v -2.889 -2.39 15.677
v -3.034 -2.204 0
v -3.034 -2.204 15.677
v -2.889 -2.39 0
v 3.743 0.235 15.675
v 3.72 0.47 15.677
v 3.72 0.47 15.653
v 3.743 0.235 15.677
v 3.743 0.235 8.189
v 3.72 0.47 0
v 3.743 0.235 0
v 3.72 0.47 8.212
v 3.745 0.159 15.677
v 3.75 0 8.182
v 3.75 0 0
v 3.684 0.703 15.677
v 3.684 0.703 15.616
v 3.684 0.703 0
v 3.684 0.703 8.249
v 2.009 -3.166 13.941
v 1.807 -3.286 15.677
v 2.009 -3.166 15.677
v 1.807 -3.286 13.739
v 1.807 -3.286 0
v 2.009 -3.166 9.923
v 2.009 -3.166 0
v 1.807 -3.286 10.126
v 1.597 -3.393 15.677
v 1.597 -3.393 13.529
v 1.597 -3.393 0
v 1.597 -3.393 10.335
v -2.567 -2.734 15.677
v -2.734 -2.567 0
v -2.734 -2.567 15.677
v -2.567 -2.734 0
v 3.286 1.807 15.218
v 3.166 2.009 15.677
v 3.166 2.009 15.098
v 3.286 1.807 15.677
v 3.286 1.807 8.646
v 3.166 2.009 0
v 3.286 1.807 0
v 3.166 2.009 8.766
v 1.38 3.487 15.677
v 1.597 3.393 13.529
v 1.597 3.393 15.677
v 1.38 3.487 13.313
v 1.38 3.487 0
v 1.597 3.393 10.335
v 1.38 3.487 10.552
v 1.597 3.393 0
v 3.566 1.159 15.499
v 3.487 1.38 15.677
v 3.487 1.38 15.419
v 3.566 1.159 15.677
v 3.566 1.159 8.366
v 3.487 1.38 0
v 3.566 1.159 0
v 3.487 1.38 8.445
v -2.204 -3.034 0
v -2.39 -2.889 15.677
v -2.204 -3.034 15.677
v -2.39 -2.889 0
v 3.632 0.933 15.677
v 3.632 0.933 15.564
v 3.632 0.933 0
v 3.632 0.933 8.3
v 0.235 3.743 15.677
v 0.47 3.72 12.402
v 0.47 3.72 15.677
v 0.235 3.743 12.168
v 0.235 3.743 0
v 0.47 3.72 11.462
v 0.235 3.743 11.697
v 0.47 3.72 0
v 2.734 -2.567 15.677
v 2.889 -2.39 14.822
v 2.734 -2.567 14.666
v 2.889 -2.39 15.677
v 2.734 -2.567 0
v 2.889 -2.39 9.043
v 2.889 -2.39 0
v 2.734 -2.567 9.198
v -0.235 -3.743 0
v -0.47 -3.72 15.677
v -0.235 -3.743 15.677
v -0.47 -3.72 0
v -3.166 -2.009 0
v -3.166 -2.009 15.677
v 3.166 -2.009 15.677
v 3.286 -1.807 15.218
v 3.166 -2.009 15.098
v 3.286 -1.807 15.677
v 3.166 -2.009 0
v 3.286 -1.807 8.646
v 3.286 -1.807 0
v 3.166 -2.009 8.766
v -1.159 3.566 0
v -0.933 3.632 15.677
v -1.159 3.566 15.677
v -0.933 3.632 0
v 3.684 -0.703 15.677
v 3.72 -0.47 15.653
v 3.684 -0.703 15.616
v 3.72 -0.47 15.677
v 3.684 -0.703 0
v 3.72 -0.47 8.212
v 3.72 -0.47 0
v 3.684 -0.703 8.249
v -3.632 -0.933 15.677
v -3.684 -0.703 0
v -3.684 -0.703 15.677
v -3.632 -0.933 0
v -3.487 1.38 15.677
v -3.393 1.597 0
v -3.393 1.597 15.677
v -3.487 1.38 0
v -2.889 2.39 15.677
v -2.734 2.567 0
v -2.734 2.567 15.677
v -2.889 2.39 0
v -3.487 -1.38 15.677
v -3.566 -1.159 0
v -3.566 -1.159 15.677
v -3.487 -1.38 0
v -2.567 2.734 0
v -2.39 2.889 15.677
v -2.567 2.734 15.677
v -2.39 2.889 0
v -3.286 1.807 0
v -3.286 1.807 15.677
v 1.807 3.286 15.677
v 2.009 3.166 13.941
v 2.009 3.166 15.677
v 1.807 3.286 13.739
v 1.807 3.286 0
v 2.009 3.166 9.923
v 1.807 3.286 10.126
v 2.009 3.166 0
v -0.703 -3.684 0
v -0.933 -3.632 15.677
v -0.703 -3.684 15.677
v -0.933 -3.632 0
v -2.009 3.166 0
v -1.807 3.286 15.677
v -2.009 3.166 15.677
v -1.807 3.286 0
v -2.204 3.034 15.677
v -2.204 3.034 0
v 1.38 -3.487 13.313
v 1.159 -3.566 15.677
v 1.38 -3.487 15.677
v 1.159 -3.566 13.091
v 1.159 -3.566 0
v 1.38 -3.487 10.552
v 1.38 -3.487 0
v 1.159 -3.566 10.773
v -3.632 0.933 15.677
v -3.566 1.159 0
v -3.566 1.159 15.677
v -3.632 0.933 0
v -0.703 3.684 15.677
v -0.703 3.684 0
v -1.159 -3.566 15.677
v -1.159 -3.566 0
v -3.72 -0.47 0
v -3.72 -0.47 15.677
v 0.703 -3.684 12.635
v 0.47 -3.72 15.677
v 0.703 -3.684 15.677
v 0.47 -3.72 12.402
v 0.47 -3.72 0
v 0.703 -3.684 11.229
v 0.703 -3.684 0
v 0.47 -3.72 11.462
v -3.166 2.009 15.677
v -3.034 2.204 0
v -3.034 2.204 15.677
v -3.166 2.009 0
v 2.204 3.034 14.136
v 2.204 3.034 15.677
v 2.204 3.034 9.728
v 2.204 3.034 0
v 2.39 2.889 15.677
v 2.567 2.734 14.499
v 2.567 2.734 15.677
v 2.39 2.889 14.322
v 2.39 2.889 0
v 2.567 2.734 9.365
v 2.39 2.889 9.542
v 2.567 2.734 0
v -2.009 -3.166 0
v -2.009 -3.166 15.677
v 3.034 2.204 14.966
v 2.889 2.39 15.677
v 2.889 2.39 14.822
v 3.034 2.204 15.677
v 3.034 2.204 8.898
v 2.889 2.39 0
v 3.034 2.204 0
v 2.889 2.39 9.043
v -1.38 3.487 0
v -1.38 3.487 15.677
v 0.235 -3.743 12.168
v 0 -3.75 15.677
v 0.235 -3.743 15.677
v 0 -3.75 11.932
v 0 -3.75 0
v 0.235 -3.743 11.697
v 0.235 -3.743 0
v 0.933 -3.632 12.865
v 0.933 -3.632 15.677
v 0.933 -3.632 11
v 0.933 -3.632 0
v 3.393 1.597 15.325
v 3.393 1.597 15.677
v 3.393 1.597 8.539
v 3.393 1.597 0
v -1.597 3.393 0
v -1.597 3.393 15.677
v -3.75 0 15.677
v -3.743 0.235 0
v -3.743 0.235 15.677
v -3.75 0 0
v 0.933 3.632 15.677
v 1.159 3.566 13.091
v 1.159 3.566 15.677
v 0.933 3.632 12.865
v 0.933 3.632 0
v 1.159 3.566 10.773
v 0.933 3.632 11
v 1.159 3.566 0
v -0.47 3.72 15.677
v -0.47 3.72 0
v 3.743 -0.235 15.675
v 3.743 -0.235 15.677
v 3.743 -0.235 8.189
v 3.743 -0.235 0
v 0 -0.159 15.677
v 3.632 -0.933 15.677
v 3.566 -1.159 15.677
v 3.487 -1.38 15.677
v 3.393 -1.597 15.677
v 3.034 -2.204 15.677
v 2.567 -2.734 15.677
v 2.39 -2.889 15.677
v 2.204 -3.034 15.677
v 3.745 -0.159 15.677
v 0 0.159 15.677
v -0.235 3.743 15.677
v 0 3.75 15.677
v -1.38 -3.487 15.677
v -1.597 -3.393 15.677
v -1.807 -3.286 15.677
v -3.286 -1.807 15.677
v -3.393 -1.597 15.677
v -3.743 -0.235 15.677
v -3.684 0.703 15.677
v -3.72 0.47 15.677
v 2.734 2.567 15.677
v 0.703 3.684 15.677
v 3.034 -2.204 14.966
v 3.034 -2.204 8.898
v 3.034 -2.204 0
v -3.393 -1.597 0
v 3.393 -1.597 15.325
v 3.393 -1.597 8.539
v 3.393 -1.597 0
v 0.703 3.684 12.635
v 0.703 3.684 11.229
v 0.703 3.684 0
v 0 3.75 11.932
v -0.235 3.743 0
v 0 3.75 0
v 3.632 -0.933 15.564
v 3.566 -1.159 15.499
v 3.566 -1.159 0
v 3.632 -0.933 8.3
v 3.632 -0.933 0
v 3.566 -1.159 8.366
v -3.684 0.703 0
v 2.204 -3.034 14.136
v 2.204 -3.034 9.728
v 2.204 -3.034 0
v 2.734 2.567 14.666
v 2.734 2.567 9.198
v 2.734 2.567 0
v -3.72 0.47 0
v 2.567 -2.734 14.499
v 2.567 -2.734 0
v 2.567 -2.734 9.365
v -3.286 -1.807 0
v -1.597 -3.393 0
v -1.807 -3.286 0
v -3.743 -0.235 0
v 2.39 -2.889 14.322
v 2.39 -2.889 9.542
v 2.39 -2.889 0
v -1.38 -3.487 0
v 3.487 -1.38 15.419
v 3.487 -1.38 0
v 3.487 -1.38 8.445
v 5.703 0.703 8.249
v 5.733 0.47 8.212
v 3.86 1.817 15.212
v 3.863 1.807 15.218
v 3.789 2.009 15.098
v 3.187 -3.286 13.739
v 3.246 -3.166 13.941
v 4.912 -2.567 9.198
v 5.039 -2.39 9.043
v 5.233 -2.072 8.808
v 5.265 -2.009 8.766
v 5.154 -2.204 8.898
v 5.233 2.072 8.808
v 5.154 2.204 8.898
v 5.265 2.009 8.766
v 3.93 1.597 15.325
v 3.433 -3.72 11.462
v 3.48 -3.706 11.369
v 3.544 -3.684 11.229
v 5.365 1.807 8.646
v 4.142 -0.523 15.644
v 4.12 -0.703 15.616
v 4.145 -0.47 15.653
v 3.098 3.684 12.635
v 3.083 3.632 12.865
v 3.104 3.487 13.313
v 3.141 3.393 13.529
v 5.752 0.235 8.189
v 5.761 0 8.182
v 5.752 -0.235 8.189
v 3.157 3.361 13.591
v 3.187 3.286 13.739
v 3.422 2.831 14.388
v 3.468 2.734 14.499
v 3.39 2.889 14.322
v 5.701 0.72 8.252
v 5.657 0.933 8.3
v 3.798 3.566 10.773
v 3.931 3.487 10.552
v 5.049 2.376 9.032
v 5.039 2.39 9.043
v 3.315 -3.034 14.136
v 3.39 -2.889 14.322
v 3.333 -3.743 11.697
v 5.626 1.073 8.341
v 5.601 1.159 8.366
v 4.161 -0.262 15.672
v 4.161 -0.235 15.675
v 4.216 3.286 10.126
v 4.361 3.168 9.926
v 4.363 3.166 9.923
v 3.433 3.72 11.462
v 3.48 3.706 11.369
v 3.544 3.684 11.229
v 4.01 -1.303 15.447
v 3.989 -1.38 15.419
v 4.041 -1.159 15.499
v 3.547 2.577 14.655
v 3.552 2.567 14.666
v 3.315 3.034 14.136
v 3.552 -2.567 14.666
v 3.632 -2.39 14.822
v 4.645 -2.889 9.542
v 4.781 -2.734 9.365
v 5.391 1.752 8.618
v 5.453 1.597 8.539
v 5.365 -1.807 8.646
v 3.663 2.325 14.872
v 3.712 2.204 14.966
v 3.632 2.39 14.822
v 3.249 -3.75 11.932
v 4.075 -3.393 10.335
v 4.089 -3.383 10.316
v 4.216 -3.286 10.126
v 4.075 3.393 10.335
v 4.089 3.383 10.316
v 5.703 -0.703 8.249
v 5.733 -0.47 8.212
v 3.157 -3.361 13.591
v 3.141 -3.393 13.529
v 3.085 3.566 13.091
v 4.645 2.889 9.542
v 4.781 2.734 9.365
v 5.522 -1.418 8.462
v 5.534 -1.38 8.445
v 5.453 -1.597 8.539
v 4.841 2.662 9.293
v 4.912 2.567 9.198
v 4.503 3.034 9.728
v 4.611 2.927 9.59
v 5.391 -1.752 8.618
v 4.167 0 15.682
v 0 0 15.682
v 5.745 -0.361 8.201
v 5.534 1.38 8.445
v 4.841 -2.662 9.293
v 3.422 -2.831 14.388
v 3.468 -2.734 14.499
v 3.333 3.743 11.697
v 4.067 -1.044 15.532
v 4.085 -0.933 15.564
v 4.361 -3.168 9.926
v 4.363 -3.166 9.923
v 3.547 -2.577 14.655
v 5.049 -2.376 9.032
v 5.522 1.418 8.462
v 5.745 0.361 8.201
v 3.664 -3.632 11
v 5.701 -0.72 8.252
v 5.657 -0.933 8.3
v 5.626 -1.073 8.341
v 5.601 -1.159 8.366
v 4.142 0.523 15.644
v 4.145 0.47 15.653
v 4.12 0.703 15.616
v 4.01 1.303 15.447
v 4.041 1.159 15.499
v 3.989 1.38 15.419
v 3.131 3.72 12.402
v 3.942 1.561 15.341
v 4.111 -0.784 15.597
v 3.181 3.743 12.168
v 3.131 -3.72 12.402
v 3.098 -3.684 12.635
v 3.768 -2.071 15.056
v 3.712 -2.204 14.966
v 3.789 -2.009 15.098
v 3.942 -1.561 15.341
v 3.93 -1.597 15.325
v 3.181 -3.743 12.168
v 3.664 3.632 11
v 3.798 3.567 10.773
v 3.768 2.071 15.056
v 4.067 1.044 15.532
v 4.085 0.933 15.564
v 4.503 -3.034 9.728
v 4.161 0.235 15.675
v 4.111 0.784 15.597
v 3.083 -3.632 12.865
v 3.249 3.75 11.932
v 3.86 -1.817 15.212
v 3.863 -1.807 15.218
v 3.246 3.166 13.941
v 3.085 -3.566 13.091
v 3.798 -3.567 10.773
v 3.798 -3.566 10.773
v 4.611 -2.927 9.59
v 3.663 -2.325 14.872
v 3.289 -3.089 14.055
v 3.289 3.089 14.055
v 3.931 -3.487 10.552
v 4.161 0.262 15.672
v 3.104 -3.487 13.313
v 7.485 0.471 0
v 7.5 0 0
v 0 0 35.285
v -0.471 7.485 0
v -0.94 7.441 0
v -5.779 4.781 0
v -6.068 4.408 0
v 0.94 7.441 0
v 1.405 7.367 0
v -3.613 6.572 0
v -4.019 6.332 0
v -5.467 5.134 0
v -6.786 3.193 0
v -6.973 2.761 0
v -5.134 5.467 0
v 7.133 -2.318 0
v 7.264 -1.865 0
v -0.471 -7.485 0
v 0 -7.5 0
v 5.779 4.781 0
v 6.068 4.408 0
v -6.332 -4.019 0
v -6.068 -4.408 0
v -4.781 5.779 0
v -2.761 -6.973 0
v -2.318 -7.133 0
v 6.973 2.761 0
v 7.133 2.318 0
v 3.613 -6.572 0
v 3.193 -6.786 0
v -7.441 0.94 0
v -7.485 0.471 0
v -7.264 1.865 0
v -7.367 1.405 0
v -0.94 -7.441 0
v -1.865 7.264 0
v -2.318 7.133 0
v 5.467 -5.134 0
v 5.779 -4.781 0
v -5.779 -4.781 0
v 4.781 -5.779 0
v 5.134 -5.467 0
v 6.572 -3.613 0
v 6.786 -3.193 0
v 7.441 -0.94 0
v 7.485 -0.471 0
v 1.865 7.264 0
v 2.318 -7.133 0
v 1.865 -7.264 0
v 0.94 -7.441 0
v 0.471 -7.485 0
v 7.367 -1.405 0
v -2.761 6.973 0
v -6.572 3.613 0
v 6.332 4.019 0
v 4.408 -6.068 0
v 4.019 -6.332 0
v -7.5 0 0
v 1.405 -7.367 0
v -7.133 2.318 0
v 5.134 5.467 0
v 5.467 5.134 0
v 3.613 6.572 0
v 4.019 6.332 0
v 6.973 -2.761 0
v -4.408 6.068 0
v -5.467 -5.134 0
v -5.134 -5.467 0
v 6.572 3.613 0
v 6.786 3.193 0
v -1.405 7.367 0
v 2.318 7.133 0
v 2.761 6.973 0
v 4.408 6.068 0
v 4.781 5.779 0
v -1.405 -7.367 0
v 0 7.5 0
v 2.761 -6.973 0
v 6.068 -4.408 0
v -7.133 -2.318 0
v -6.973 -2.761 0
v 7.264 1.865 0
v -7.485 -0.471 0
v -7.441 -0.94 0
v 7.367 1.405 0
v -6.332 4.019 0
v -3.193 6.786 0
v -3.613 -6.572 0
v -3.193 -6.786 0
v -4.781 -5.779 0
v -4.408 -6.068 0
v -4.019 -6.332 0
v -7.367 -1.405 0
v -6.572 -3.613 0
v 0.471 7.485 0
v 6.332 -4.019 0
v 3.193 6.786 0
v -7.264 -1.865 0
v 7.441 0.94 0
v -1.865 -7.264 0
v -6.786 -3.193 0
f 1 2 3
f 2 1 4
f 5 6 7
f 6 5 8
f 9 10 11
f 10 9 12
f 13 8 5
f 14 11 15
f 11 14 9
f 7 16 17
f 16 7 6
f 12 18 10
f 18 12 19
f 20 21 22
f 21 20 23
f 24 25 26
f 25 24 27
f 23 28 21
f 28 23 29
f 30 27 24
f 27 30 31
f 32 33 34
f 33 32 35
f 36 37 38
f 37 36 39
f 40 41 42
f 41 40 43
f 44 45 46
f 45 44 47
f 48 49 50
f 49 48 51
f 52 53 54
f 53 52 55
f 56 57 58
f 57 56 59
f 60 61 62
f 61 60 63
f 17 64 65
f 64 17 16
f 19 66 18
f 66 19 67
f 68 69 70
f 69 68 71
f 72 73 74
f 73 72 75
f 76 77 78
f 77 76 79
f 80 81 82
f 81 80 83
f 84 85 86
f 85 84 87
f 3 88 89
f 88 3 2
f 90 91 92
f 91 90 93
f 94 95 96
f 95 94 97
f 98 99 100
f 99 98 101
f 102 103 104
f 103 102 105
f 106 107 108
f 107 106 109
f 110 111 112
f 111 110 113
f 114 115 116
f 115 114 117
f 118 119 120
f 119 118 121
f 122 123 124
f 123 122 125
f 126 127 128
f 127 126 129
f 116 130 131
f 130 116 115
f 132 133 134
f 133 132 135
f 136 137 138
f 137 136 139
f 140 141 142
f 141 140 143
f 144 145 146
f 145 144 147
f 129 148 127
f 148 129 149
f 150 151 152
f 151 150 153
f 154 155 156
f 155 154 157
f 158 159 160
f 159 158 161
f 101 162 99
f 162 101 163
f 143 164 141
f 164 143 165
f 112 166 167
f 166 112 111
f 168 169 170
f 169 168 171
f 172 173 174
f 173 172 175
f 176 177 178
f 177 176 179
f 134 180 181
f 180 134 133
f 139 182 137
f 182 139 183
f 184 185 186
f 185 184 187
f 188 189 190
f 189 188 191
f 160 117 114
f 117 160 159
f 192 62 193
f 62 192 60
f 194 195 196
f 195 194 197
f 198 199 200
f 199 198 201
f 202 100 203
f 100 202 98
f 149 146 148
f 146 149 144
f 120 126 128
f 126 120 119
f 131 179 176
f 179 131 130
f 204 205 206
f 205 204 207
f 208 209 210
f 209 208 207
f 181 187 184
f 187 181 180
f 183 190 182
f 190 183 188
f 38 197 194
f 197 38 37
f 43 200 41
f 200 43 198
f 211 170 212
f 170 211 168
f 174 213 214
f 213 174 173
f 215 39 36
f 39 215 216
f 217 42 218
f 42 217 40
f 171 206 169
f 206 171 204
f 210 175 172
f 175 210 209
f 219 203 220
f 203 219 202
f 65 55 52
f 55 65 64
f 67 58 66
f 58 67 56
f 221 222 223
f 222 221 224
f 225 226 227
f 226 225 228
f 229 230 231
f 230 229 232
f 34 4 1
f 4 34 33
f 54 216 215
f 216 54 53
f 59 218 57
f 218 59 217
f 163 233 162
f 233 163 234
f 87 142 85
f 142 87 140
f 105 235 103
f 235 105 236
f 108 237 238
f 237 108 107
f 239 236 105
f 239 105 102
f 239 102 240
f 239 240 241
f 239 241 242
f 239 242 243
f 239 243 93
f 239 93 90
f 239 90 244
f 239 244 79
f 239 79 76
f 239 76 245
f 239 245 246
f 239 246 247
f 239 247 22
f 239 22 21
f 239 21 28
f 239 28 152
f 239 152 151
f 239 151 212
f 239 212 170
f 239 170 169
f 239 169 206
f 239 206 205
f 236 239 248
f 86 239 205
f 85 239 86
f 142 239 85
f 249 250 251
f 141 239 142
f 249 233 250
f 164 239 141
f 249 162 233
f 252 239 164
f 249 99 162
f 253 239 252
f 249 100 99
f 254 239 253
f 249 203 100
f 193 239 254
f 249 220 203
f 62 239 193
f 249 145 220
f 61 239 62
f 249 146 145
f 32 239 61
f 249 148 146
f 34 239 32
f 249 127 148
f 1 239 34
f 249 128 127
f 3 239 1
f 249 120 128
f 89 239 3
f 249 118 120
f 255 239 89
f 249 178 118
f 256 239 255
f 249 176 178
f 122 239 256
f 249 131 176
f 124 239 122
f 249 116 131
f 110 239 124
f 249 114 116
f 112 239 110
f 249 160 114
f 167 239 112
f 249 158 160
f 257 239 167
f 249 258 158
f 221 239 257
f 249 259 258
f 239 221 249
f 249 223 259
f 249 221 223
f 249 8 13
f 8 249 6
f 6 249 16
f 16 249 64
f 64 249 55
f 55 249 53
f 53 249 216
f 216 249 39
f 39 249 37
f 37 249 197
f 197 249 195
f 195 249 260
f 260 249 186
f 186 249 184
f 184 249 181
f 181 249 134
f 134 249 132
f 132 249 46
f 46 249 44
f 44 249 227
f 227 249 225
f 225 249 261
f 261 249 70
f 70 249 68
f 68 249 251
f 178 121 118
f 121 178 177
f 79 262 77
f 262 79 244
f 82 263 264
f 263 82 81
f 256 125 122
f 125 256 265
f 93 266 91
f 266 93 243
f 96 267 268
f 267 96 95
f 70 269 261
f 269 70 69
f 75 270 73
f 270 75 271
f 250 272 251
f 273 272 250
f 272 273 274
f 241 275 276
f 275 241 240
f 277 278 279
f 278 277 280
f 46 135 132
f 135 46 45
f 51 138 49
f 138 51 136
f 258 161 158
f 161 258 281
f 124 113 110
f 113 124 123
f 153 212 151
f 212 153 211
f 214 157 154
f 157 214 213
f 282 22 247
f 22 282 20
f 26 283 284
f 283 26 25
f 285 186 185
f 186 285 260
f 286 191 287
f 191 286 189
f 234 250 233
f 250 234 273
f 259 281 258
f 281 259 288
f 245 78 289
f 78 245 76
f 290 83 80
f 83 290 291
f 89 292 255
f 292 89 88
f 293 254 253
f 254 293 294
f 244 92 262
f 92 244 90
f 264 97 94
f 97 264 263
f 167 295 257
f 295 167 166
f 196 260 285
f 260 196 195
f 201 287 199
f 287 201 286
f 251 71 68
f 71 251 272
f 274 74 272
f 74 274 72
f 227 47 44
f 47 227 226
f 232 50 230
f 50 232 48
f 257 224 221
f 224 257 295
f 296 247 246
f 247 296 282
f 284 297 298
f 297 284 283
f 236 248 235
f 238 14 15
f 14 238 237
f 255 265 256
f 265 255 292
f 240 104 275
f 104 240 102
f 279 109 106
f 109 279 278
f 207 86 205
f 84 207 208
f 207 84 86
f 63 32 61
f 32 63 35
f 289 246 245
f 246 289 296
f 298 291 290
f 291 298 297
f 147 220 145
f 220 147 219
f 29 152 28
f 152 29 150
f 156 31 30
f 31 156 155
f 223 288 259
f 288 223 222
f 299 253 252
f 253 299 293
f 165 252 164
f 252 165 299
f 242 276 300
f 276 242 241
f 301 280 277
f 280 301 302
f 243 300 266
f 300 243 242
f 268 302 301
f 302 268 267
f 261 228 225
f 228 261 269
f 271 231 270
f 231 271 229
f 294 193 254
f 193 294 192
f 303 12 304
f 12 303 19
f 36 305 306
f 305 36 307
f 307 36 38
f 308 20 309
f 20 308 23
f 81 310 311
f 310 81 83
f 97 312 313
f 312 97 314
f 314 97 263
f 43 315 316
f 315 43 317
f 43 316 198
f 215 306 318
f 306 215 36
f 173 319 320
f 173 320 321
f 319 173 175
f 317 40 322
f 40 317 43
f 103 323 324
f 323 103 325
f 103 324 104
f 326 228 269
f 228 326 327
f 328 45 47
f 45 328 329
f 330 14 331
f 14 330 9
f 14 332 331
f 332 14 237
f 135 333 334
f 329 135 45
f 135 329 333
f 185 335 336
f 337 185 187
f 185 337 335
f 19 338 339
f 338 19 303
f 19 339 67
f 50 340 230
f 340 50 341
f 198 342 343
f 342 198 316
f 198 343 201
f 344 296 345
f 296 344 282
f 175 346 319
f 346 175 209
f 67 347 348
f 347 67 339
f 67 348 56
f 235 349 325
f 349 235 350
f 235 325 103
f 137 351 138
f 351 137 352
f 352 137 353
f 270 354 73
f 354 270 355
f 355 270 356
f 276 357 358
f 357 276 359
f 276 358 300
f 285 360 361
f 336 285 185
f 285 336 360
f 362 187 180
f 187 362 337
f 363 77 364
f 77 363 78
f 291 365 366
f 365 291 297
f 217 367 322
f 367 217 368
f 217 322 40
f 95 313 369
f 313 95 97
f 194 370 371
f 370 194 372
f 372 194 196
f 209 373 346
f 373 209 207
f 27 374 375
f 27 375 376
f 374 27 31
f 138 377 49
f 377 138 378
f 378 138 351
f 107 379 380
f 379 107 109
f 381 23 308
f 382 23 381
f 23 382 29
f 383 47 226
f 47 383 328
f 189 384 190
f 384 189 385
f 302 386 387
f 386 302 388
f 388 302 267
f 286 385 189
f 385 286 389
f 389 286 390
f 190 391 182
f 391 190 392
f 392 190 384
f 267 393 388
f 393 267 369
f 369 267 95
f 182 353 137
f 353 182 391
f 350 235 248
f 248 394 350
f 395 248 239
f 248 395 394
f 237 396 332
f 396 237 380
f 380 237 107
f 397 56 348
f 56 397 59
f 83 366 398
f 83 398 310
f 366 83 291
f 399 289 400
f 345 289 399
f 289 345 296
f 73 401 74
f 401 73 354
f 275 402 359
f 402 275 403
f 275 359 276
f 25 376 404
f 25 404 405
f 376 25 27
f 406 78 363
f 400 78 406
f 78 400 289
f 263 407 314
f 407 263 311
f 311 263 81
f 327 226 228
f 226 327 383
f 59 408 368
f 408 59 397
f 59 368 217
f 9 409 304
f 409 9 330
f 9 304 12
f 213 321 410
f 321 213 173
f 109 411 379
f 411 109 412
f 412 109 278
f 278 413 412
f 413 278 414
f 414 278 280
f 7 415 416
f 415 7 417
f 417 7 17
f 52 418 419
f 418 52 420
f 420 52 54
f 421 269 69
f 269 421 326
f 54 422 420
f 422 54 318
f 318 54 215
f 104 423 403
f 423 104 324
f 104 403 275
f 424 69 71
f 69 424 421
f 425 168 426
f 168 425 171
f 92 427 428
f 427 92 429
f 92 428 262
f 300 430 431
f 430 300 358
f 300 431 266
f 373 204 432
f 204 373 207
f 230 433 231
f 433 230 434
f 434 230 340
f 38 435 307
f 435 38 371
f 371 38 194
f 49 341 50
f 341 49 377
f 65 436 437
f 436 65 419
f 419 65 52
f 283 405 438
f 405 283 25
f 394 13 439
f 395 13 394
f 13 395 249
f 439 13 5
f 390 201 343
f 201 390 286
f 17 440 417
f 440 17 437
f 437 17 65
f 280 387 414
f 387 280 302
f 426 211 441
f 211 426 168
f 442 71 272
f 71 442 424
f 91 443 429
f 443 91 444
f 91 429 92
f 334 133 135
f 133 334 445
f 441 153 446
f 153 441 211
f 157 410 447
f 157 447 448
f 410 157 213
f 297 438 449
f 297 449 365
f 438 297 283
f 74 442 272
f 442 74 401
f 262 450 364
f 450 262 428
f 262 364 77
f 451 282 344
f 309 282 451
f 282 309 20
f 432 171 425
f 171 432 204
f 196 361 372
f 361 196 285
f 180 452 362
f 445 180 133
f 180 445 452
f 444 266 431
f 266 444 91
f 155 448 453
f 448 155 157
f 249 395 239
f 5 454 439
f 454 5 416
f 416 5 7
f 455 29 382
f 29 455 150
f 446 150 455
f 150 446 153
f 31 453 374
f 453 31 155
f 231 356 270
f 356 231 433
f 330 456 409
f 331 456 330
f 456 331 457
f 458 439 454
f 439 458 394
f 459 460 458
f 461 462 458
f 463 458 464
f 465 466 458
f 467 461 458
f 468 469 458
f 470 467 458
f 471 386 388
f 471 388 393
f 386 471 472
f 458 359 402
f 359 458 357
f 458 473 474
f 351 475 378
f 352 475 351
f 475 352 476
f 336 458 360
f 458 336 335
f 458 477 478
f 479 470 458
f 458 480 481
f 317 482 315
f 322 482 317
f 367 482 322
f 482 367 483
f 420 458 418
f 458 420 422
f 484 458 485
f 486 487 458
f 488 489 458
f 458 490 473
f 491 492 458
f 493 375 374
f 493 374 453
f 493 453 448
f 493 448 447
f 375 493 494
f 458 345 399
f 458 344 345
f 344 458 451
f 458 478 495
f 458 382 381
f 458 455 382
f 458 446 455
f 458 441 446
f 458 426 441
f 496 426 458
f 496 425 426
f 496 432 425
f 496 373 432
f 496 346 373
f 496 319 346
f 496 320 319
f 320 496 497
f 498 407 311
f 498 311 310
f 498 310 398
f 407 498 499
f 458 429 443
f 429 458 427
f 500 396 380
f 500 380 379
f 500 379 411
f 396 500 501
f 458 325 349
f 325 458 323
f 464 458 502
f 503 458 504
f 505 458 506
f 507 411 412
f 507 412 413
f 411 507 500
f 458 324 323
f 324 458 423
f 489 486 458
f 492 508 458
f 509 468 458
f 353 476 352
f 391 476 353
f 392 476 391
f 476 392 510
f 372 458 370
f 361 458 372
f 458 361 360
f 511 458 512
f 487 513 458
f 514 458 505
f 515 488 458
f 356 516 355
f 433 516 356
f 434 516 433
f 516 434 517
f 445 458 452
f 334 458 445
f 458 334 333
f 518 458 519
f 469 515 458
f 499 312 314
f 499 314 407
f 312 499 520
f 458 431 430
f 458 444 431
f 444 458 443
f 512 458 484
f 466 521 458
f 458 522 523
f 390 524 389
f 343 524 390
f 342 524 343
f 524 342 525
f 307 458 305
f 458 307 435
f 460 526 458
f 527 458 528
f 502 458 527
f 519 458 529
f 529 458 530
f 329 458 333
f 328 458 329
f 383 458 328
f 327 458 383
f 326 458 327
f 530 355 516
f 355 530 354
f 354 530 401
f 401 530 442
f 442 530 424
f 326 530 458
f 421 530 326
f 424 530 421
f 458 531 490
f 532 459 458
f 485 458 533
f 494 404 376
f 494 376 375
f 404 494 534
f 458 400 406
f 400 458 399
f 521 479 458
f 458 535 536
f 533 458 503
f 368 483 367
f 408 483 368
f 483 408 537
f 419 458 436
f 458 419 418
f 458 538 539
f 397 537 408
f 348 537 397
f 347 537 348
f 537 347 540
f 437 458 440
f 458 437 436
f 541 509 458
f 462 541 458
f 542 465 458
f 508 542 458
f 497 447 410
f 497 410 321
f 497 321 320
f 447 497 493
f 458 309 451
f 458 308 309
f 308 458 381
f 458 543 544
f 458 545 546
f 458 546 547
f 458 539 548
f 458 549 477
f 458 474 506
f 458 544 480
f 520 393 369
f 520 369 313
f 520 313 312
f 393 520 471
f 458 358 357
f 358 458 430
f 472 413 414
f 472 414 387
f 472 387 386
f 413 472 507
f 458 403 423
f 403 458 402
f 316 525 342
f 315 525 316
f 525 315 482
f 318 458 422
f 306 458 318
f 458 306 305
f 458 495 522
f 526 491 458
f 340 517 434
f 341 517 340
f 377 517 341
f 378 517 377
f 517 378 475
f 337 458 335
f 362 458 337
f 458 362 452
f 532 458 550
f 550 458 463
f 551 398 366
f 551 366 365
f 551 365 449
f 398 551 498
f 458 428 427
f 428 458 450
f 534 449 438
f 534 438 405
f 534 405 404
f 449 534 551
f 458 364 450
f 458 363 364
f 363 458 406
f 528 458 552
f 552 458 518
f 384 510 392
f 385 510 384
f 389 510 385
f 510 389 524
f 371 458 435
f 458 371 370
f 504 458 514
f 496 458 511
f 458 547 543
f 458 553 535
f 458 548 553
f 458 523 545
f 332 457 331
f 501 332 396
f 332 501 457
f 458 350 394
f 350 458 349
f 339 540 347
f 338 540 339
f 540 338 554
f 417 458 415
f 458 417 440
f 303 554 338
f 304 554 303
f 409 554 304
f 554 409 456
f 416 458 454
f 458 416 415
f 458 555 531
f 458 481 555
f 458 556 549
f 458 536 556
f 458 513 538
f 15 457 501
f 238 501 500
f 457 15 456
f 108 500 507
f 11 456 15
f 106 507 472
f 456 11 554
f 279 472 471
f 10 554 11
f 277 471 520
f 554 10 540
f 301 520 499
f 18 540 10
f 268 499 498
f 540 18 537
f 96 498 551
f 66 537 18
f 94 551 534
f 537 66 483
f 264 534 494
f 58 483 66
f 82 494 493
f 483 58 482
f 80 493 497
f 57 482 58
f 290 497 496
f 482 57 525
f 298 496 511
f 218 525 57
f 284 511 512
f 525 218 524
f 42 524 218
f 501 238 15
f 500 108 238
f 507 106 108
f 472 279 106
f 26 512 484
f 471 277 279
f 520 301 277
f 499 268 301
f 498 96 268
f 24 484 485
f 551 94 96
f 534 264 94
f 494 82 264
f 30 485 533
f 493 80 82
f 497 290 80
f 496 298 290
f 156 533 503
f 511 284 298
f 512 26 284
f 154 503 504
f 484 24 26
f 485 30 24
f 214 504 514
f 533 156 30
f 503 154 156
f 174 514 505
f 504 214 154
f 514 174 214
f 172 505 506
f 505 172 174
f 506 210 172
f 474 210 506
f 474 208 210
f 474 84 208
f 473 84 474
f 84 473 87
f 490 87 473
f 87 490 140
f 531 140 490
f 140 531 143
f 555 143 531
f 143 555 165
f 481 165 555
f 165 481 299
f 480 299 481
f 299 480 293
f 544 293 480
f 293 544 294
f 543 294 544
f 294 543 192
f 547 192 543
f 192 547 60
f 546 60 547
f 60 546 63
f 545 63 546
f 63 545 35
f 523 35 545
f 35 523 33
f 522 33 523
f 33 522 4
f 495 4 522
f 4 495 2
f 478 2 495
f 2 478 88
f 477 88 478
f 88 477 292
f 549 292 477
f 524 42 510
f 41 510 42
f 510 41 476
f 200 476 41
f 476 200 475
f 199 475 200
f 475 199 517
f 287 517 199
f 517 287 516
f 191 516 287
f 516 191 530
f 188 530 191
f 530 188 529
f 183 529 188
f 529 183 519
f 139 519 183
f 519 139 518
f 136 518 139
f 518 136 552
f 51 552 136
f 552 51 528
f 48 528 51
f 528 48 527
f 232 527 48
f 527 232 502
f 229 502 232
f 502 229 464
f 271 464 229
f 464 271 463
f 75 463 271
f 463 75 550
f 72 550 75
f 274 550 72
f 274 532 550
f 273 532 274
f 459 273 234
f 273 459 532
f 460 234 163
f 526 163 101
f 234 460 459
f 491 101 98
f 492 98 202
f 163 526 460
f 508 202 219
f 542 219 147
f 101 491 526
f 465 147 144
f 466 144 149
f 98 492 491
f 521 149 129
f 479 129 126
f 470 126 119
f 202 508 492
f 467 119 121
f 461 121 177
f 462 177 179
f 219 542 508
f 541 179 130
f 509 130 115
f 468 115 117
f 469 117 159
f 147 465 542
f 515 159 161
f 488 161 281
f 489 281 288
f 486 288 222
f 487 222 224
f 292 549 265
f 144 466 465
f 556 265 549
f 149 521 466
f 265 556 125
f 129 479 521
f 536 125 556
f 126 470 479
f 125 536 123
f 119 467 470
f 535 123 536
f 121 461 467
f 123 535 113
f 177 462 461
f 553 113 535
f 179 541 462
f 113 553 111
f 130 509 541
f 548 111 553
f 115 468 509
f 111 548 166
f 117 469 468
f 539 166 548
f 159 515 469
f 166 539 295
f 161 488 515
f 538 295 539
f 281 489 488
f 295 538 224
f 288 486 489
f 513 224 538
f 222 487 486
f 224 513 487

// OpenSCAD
resolution=100;

shape_tube_d=30;

puncture_tube_d=shape_tube_d/2;
puncture_tube_r=puncture_tube_d/2;

puncture_tube_h=puncture_tube_r/tan(12);

venturi_r=puncture_tube_r/2;
venturi_h=puncture_tube_h/2.25;

echo (puncture_tube_r, puncture_tube_h);

//S=o/h
//c=a/h
//t=o/a
//a=o/t

difference() {
	cylinder(r2=0, r1=puncture_tube_r, h=puncture_tube_h, $fn=resolution);

	union(){
		translate([0,0,-0.005])
			cylinder(r=venturi_r, h=venturi_h, $fn=resolution);
		translate([0,0,venturi_h-venturi_r])
			rotate([0,90,0])
				cylinder(r=venturi_r, h=venturi_h, $fn=resolution);
		}
}
